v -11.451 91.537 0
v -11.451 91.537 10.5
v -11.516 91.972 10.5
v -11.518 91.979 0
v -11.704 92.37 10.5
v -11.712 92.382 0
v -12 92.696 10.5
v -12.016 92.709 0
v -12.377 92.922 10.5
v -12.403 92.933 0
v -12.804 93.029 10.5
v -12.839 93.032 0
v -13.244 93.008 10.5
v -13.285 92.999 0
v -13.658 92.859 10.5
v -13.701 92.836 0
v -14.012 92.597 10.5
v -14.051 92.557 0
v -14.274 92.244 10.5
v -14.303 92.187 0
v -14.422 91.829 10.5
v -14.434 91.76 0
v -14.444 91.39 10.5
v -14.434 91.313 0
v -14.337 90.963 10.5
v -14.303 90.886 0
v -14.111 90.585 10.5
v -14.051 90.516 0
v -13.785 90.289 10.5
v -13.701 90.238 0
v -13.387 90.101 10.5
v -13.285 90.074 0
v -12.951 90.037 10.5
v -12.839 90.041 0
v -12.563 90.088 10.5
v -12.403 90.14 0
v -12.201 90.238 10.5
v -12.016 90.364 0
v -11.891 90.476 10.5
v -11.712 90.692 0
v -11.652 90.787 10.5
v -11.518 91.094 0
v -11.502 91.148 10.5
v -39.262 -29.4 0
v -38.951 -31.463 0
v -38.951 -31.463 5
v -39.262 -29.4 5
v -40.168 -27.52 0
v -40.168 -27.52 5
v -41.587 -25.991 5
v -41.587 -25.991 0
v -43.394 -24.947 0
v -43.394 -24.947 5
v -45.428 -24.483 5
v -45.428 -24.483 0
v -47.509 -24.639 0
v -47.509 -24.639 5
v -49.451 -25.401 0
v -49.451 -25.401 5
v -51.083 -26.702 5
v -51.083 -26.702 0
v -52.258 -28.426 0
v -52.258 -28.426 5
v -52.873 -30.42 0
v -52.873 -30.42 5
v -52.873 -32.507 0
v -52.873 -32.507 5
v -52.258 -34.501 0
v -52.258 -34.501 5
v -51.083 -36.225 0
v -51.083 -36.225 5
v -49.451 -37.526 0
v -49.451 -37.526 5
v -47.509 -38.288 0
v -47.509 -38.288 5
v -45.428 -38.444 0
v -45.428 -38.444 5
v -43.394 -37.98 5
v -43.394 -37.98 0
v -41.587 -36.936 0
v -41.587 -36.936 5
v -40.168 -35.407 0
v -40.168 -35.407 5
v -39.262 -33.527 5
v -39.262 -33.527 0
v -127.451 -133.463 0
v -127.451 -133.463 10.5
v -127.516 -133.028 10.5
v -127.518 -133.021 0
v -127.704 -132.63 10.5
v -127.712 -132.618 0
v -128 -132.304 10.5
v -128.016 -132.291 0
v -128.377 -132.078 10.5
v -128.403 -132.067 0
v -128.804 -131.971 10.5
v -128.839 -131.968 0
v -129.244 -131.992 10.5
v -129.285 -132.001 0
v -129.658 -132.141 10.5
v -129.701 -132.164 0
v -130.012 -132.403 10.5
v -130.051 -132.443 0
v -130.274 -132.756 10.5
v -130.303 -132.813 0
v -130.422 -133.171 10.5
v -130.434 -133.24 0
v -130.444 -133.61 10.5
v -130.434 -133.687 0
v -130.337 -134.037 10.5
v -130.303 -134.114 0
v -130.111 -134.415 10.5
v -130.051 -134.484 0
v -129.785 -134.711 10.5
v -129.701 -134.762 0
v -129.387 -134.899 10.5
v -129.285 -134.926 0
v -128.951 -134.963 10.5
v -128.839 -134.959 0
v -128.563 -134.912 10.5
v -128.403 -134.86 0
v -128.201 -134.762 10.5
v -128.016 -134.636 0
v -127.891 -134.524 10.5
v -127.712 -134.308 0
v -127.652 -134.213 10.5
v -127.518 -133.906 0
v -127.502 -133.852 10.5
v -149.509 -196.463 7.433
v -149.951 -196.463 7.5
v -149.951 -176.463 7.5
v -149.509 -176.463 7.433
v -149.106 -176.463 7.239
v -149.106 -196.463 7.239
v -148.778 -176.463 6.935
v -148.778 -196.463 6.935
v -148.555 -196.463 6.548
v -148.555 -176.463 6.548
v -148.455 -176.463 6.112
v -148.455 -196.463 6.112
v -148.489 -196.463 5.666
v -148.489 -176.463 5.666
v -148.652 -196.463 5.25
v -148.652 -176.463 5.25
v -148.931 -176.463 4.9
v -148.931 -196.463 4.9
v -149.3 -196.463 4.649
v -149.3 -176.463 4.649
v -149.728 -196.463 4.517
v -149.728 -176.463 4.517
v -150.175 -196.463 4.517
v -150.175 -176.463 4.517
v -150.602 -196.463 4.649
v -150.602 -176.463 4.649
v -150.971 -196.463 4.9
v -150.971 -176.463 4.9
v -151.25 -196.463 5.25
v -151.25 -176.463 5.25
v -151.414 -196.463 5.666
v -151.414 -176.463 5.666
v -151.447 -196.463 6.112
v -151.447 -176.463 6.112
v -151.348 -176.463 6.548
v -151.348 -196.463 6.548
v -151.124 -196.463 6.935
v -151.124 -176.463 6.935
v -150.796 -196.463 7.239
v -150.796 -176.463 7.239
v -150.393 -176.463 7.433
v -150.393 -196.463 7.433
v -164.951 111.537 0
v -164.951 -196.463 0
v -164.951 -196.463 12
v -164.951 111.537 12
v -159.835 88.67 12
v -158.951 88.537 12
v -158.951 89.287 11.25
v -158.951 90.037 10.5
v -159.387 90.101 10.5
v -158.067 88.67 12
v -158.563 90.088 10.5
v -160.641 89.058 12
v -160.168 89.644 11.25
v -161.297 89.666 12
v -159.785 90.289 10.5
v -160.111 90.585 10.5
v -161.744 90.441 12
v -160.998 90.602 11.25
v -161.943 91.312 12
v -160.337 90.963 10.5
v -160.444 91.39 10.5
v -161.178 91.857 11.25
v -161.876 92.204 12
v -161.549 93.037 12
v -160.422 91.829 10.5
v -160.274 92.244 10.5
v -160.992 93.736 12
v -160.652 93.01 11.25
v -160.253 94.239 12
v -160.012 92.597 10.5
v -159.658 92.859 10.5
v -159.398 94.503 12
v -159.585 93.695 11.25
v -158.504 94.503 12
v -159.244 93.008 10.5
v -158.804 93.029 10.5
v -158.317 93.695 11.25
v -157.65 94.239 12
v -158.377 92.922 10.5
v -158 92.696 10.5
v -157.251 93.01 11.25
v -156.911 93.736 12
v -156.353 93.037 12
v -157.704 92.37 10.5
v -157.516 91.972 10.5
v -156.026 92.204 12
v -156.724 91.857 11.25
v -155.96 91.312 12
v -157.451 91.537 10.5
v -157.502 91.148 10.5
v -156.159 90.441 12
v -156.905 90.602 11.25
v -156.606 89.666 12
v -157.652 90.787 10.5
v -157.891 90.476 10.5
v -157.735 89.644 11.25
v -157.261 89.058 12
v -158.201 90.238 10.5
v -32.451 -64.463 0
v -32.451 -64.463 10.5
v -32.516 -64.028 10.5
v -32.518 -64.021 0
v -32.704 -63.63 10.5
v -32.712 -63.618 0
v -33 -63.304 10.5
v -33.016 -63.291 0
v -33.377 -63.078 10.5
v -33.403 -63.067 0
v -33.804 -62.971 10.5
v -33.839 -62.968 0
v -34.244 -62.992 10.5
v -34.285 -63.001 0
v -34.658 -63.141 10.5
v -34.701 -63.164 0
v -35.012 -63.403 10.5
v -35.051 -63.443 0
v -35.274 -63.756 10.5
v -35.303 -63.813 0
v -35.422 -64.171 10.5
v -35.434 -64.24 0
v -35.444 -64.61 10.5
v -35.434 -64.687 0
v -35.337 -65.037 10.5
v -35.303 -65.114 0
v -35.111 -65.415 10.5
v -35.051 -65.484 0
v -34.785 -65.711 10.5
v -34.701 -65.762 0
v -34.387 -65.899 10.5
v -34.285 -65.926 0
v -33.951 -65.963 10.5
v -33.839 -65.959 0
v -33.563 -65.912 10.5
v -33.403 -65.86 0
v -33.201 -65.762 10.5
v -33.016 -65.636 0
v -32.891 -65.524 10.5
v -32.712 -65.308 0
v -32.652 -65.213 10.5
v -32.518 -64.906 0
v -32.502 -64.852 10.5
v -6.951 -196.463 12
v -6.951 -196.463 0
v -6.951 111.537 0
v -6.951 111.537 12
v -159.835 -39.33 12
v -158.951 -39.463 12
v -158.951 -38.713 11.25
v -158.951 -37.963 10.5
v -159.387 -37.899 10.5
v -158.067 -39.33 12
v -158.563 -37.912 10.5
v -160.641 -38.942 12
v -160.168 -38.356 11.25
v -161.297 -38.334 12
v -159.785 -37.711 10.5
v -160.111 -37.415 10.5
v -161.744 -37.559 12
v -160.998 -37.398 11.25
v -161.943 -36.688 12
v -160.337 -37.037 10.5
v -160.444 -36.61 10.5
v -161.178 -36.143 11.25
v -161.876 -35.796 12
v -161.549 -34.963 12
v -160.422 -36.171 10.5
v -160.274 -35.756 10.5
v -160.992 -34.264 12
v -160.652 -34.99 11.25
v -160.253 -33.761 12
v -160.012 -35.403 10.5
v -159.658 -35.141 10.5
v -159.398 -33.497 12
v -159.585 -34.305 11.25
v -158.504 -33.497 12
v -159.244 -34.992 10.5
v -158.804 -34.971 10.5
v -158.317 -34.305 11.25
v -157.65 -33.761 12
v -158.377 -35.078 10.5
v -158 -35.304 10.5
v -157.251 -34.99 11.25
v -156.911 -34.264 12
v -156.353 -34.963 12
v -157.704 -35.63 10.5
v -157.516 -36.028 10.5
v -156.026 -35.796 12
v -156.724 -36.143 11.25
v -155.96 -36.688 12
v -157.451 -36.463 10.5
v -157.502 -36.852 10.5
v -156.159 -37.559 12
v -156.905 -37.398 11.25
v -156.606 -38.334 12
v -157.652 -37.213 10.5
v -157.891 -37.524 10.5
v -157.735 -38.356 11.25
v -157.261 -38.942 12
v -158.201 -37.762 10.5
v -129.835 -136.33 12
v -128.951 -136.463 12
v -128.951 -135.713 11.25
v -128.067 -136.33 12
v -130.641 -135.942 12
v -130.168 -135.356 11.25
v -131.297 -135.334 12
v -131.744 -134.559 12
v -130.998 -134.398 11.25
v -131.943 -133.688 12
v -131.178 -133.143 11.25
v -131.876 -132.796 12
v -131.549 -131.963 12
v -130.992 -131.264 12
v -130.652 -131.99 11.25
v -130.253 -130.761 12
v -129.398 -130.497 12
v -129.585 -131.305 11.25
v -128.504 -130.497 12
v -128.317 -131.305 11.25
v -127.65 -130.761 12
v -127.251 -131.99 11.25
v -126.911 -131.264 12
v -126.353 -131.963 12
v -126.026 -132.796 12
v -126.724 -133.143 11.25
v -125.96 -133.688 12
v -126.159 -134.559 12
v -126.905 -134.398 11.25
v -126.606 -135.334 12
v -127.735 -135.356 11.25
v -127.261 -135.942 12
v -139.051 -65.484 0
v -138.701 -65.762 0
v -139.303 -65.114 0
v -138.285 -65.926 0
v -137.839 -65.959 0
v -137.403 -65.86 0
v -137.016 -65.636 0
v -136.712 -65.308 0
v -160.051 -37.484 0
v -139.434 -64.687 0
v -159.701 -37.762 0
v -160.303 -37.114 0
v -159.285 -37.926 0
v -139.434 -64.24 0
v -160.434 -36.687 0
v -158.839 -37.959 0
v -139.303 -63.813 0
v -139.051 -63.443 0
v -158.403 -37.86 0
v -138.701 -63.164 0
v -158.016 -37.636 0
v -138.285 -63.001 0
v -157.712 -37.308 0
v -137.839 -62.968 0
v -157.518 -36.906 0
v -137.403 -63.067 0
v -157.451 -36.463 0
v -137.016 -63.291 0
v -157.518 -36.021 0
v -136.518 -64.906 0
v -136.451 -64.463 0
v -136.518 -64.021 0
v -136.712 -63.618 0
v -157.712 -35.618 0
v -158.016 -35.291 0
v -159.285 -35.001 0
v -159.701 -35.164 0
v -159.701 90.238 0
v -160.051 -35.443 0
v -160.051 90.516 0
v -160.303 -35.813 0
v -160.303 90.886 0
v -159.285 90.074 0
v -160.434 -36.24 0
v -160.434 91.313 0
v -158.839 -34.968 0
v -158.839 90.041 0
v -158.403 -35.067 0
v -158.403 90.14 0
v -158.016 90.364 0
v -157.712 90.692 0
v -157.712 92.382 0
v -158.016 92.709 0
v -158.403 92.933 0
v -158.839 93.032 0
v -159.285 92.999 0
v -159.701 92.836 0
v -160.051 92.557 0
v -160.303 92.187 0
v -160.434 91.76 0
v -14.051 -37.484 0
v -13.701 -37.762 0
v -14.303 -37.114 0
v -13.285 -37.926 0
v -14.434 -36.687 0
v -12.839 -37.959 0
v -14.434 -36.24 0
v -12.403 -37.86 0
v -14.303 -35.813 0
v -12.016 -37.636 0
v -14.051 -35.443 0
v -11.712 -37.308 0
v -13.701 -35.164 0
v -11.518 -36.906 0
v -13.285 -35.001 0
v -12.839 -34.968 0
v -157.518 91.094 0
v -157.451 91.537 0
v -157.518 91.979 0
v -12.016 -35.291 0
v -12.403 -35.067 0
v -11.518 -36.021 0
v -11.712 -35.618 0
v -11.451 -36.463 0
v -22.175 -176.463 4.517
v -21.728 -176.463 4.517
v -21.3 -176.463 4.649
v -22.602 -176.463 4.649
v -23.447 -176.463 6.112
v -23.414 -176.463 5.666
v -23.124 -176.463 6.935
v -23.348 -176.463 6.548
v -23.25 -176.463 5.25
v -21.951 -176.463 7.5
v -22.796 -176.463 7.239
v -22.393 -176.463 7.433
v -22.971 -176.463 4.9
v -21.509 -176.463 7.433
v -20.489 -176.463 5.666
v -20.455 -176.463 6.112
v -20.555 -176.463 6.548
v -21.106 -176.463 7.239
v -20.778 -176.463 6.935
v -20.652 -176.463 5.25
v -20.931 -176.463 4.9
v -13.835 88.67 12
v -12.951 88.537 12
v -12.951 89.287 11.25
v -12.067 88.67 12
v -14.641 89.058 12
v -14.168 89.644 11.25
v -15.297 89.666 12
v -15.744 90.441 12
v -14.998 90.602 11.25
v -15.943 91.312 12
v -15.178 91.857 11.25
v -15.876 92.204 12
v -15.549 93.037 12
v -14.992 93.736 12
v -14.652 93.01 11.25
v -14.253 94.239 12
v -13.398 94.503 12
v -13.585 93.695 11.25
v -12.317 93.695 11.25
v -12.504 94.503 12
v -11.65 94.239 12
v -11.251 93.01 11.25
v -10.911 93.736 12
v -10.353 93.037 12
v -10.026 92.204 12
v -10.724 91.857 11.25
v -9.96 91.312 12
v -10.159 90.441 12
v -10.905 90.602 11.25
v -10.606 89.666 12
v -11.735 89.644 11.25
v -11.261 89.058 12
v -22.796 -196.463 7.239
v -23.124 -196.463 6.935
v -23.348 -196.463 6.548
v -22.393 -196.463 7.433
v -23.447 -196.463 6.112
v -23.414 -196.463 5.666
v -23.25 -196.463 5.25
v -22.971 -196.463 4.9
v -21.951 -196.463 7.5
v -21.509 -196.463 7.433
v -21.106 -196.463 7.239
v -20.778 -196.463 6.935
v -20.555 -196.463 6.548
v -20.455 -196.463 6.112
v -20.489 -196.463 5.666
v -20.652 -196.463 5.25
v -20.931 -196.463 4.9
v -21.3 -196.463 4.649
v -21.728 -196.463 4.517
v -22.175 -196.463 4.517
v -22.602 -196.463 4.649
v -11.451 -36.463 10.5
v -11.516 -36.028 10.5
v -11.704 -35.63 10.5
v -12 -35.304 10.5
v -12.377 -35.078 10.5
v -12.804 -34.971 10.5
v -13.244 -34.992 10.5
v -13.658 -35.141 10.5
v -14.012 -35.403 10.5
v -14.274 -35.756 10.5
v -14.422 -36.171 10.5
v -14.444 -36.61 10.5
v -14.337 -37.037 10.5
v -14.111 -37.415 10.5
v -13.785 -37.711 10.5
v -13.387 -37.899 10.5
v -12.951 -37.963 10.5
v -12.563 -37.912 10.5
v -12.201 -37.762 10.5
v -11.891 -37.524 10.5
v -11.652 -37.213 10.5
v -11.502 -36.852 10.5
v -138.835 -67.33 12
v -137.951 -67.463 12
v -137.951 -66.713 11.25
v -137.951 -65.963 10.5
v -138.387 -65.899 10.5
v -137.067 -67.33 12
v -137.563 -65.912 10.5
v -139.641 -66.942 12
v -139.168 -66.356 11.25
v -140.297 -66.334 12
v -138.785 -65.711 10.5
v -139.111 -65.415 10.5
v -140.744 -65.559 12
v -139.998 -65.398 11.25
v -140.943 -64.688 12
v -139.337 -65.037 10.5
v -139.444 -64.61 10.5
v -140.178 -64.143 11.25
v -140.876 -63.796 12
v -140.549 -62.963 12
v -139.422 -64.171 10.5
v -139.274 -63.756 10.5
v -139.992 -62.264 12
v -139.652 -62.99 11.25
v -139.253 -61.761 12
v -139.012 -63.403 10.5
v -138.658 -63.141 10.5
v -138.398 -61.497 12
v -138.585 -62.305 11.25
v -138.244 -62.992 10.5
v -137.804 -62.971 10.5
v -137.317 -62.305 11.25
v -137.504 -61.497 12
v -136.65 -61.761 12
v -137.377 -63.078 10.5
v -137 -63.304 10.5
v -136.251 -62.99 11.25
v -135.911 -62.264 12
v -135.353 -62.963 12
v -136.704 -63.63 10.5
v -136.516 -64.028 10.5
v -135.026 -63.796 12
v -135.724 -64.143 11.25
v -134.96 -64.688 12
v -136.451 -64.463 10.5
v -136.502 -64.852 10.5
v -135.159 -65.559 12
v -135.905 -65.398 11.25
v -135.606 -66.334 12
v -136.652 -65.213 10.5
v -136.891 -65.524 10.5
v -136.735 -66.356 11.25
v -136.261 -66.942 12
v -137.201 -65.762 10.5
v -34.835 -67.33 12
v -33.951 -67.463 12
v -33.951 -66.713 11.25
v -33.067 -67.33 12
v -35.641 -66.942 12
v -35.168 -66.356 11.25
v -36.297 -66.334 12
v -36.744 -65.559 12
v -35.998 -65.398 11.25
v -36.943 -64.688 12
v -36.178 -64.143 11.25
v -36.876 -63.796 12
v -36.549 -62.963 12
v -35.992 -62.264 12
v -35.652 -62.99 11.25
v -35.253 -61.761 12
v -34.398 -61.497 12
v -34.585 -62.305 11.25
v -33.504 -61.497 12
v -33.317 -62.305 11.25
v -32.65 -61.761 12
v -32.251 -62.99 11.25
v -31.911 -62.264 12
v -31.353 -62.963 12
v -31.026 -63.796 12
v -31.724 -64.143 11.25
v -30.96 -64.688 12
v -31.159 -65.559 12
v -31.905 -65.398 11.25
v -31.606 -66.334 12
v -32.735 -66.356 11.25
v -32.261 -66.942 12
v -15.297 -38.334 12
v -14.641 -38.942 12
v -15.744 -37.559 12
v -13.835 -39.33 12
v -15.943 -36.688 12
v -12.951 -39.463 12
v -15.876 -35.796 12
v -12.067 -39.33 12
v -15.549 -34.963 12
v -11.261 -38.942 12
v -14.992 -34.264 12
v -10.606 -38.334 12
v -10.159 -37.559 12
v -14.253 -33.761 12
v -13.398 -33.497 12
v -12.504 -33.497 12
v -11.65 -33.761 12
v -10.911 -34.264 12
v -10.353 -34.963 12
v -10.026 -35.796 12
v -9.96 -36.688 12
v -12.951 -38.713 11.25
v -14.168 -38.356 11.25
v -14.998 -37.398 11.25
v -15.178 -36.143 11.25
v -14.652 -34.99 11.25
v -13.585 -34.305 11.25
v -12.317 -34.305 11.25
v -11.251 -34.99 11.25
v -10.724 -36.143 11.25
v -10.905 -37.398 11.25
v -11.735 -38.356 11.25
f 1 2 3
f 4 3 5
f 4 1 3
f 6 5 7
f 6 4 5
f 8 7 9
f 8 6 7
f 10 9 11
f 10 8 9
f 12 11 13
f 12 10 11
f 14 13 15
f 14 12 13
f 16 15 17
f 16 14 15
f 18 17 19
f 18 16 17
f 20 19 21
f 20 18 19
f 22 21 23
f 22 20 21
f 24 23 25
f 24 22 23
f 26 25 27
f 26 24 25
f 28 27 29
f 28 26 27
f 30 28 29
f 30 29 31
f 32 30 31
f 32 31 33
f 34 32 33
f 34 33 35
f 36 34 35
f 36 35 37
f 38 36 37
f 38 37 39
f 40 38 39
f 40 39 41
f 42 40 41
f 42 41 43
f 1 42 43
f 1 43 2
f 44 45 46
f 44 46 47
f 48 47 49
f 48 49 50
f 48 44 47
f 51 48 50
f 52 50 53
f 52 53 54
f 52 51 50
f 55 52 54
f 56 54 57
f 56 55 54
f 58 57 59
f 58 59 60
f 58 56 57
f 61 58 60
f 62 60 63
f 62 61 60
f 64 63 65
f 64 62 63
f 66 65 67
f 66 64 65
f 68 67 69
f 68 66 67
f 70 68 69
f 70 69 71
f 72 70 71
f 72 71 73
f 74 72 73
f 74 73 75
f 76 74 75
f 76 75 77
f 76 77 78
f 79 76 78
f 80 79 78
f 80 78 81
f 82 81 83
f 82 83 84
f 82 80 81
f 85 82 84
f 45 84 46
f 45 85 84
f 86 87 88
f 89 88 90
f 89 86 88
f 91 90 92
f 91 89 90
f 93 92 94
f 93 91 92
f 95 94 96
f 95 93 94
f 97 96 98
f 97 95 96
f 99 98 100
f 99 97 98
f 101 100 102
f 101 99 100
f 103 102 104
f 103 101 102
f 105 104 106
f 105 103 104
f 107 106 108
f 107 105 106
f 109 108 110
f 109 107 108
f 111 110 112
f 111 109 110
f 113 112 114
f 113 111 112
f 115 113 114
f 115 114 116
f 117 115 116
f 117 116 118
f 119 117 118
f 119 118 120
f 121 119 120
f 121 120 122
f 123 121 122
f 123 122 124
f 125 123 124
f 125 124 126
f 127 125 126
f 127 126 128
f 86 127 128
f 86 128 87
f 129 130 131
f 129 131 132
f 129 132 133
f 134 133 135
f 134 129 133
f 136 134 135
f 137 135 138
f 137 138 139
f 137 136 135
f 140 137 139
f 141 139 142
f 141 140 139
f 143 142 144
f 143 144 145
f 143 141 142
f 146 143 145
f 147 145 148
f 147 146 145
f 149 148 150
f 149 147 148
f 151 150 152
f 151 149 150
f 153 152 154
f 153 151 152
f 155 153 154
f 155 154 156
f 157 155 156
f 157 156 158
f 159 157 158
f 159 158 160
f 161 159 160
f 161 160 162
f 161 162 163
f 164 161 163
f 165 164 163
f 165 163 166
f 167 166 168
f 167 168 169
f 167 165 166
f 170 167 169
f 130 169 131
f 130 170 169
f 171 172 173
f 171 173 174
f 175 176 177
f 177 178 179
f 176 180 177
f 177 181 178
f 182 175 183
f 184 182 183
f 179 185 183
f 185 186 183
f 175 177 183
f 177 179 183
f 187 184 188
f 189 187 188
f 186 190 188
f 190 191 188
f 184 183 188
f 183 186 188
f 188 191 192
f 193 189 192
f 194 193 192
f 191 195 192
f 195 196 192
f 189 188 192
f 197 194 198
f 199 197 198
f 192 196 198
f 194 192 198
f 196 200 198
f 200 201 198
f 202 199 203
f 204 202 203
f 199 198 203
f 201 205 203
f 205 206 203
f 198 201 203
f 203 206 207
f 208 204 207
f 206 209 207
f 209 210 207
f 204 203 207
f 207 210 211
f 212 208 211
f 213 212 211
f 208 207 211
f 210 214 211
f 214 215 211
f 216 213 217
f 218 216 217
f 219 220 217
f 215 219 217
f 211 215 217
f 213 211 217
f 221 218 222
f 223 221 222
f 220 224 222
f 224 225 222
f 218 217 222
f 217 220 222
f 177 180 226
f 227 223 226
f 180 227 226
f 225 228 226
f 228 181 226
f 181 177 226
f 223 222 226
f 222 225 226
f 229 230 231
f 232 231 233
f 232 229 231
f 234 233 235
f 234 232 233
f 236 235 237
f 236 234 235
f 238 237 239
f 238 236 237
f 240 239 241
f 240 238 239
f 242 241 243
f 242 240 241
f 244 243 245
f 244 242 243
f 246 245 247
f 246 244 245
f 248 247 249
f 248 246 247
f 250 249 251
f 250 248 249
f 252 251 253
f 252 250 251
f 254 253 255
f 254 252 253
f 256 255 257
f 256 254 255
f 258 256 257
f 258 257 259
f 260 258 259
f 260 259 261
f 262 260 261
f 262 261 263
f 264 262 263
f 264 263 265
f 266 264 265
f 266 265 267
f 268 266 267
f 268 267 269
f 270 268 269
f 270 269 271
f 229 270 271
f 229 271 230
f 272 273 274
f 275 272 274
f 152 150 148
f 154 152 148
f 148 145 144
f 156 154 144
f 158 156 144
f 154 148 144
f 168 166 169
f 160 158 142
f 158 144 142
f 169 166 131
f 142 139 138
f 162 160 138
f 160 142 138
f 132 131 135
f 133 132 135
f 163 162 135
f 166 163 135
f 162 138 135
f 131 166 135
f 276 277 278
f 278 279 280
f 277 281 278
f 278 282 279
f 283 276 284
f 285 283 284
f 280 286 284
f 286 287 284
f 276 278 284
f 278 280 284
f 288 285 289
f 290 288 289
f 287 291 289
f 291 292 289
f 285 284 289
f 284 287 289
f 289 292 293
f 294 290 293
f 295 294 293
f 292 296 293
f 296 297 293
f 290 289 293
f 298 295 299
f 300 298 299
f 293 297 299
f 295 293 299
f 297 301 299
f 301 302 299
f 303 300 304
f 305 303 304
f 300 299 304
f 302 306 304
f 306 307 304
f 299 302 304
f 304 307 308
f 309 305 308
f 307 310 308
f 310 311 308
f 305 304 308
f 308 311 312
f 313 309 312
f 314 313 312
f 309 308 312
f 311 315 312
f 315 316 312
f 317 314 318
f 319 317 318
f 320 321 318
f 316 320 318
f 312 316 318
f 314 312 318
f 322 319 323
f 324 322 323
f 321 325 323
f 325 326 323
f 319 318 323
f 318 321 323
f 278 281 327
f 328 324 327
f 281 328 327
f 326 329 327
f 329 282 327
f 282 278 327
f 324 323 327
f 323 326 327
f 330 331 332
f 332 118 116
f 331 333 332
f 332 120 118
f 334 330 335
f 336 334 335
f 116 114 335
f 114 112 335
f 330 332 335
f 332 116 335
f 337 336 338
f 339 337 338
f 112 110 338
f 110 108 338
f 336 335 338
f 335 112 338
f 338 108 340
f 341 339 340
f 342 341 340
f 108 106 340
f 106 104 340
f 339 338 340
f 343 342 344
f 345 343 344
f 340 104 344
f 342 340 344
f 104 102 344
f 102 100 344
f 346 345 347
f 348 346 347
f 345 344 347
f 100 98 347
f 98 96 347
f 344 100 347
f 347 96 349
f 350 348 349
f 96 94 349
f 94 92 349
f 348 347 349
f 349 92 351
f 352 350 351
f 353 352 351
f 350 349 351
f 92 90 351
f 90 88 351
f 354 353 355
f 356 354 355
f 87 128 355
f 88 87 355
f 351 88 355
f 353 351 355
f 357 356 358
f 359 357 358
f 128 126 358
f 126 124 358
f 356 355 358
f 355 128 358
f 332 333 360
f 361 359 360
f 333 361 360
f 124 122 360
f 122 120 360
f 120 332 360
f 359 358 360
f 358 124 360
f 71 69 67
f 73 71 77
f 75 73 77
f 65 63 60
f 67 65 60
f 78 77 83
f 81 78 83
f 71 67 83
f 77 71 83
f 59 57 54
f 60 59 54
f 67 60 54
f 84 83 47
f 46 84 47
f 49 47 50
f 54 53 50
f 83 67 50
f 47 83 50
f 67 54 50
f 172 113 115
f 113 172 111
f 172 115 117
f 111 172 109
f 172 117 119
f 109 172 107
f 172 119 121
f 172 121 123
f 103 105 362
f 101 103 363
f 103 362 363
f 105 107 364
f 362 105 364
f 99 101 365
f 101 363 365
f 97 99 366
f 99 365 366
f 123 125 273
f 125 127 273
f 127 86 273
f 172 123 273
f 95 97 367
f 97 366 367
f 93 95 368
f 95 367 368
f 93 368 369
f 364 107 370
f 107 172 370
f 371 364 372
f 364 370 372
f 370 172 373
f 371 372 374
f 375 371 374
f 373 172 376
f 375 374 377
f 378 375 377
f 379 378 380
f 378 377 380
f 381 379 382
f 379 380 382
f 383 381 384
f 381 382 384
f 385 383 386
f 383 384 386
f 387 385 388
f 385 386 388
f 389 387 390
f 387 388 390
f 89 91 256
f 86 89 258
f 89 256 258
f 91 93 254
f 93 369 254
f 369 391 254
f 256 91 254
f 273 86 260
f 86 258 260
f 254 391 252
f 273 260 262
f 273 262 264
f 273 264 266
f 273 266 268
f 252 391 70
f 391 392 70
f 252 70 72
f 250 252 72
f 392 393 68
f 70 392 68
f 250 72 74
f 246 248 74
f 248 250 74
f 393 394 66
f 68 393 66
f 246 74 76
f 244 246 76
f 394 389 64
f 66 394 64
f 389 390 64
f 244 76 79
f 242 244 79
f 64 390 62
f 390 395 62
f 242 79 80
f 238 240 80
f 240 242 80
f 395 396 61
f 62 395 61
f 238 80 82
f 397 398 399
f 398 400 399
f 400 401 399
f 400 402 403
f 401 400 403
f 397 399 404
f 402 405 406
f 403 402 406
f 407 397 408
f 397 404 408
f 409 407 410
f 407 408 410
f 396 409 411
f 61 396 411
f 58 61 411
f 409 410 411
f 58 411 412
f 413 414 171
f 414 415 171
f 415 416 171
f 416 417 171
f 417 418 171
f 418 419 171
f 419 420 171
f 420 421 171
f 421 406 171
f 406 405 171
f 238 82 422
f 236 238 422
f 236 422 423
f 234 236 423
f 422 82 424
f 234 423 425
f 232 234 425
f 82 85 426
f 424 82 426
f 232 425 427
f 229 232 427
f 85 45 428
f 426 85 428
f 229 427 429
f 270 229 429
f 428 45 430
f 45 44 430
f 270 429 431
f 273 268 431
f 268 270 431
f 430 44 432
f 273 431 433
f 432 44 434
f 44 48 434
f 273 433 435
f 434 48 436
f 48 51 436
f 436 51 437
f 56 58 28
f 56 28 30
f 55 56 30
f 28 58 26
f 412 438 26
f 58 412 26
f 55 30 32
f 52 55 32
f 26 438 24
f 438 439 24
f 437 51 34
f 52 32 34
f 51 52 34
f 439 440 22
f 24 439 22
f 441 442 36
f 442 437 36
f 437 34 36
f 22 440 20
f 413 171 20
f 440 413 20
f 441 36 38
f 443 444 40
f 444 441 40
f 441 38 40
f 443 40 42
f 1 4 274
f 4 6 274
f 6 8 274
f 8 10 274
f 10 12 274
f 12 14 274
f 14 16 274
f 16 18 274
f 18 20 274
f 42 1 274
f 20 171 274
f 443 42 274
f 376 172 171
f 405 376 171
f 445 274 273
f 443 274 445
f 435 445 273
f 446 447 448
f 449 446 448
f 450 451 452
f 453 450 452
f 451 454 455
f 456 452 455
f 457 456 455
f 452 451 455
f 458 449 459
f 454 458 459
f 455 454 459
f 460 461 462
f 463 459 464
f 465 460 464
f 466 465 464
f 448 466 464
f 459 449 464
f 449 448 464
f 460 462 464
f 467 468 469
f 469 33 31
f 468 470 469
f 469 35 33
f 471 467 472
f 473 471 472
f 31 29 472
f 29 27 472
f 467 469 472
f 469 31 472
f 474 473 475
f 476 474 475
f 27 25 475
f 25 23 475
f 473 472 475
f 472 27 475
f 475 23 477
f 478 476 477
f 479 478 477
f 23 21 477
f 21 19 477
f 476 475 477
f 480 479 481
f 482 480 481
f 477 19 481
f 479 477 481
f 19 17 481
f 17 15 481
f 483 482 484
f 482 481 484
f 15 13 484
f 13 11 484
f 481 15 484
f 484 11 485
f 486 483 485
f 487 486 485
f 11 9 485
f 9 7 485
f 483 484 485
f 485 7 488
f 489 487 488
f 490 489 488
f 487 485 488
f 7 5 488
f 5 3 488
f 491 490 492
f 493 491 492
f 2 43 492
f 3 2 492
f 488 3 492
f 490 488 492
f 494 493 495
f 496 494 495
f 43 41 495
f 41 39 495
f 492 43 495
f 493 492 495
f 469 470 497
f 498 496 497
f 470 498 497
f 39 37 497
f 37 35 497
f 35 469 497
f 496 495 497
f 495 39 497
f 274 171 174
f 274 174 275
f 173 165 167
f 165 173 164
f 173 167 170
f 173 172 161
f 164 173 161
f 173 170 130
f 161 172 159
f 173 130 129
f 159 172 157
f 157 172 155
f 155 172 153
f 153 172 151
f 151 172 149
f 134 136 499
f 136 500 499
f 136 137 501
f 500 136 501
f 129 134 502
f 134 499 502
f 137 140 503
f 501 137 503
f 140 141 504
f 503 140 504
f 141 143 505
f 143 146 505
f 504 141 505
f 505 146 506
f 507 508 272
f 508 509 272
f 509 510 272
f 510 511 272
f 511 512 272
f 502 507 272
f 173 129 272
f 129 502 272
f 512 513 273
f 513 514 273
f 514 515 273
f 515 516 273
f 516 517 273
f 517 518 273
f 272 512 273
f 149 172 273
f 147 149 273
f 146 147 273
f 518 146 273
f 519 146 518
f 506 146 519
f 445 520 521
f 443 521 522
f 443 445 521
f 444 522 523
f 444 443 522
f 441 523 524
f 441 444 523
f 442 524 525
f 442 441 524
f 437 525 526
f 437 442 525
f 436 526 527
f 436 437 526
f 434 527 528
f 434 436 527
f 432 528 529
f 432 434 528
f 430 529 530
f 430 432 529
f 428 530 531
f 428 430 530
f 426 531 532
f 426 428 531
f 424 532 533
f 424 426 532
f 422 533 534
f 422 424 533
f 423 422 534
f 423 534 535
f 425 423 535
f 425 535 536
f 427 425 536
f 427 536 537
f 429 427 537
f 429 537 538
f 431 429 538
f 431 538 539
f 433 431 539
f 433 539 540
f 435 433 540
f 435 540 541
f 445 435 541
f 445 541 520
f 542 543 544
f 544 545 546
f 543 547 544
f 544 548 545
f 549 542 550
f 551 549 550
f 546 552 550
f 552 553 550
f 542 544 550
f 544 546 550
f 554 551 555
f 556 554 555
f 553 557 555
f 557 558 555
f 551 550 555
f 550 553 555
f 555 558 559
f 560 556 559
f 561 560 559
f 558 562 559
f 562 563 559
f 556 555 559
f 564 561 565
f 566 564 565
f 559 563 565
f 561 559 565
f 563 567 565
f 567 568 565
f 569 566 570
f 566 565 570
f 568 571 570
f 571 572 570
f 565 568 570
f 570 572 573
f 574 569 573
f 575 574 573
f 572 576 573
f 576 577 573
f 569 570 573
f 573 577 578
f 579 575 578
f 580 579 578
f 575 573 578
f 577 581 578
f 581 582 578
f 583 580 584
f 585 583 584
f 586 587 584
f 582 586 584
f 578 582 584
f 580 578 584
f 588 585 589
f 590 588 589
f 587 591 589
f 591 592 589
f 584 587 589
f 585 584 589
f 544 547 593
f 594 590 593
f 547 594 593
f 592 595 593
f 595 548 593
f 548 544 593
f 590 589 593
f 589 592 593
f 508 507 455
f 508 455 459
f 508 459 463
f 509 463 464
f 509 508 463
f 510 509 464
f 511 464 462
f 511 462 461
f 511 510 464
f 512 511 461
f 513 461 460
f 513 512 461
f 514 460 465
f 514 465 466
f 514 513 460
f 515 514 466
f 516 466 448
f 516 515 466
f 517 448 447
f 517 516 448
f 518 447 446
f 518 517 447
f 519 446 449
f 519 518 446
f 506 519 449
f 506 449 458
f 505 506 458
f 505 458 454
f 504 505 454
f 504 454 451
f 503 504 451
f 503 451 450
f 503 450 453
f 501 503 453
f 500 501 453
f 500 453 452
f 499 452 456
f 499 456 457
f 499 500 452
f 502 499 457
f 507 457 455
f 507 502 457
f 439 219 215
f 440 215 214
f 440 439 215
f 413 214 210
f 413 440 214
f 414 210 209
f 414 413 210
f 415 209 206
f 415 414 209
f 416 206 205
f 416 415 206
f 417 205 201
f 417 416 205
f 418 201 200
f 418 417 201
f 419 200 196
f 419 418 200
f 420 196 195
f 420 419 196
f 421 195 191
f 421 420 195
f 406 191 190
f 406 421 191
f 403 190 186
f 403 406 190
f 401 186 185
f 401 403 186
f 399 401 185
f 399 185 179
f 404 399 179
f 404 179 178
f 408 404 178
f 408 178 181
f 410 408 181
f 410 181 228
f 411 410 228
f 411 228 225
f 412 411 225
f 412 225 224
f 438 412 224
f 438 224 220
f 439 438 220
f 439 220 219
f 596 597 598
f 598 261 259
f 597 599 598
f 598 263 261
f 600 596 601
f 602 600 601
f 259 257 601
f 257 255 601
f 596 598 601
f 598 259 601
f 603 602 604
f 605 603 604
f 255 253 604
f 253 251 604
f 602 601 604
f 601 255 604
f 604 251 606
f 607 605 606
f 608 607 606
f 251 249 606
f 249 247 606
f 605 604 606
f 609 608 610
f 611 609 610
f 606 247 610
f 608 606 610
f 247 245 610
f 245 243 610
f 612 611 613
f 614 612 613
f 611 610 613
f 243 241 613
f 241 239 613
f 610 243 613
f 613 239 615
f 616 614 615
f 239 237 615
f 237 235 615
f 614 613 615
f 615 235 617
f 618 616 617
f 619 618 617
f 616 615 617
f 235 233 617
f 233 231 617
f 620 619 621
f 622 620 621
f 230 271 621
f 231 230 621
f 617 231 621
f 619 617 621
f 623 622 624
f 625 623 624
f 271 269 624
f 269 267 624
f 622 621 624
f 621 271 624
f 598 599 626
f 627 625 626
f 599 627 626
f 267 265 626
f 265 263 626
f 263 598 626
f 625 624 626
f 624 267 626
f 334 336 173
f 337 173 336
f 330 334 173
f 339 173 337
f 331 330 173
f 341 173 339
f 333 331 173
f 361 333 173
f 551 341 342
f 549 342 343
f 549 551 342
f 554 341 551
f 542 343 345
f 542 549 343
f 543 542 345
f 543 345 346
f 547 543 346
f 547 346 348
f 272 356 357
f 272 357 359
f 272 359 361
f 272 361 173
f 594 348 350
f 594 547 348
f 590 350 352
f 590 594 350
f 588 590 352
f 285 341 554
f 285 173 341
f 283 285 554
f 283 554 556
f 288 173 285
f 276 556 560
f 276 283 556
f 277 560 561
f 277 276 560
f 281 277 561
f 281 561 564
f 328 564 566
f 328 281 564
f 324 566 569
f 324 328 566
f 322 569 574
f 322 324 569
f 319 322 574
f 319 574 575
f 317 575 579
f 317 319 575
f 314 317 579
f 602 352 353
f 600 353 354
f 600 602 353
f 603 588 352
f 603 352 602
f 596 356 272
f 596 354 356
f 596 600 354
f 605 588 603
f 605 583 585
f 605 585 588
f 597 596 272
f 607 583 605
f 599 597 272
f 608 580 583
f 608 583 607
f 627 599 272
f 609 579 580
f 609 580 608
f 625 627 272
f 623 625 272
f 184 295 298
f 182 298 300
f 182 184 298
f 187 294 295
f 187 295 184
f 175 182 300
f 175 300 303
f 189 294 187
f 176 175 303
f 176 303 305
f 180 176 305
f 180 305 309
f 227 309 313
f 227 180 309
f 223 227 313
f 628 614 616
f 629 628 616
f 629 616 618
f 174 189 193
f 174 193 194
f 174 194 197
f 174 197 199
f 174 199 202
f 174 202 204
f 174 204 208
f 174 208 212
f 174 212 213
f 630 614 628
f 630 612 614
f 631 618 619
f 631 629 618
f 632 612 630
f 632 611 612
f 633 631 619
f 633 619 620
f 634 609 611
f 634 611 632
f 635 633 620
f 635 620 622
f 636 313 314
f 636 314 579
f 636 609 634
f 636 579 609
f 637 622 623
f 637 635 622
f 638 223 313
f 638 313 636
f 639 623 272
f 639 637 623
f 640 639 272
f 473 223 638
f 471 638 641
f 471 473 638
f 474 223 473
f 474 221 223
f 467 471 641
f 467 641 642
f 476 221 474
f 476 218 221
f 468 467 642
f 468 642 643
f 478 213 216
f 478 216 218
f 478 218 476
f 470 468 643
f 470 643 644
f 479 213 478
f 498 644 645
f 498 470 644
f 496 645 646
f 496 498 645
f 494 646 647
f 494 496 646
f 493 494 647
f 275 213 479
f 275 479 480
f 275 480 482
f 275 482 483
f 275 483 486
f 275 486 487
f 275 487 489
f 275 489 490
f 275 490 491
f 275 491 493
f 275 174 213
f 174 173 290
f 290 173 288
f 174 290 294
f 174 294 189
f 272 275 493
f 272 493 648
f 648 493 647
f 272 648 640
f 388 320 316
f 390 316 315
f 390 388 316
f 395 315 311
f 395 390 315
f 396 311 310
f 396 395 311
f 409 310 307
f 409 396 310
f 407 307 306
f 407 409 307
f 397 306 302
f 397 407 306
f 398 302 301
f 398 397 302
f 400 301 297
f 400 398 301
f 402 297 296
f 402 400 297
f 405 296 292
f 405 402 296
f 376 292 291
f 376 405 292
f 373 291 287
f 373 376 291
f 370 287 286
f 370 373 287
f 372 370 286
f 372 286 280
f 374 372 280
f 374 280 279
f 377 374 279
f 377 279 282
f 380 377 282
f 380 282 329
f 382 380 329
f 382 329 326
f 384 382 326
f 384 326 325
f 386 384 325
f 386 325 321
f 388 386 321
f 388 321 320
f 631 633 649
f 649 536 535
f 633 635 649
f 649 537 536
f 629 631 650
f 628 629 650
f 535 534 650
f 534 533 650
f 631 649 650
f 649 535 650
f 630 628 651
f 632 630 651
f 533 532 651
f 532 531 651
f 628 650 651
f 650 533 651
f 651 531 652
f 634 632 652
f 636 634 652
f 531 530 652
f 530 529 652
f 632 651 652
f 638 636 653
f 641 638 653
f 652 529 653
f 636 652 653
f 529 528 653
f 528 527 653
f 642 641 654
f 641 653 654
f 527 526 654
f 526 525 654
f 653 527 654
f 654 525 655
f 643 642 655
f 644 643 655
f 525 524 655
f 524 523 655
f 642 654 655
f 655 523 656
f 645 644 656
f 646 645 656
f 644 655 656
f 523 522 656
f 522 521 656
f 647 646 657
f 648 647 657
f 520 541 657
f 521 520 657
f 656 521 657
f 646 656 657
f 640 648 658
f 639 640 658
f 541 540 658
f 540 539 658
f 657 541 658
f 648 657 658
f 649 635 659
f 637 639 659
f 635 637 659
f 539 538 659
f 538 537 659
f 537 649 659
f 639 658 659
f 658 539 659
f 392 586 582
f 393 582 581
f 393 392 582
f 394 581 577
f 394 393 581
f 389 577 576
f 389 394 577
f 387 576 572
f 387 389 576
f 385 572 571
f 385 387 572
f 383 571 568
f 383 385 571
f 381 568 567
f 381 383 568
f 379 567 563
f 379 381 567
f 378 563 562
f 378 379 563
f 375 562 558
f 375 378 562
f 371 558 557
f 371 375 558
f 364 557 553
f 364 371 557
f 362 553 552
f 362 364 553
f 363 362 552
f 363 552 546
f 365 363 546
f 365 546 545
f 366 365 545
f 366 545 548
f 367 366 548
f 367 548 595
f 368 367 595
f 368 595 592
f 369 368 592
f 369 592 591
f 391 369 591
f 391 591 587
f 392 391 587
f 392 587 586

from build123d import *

# Parameters (mm, degrees)
SKETCH1_W           = 158
SKETCH1_H           = 308
SKETCH1_R           = 1.5
BOSS_EXTRUDE1_DEPTH = 12
CUT_EXTRUDE3_START  = -196.463415
SKETCH4_R           = 1.5
CUT_EXTRUDE3_DEPTH  = 20
SKETCH6_R           = 7
CUT_EXTRUDE5_DEPTH  = 5


with BuildPart() as part:
    # Sketch1 → Boss-Extrude1 (new body)
    with BuildSketch(Plane.XY):
        with Locations((-85.951219512, -42.463414634)):
            Rectangle(SKETCH1_W, SKETCH1_H)
        with Locations((-137.951219512, -64.463414634)):
            Circle(SKETCH1_R, mode=Mode.SUBTRACT)
        with Locations((-33.951219512, -64.463414634)):
            Circle(SKETCH1_R, mode=Mode.SUBTRACT)
        with Locations((-128.951219512, -133.463414634)):
            Circle(SKETCH1_R, mode=Mode.SUBTRACT)
        with Locations((-158.951219512, 91.536585366)):
            Circle(SKETCH1_R, mode=Mode.SUBTRACT)
        with Locations((-158.951219512, -36.463414634)):
            Circle(SKETCH1_R, mode=Mode.SUBTRACT)
        with Locations((-12.951219512, 91.536585366)):
            Circle(SKETCH1_R, mode=Mode.SUBTRACT)
        with Locations((-12.951219512, -36.463414634)):
            Circle(SKETCH1_R, mode=Mode.SUBTRACT)
    extrude(amount=BOSS_EXTRUDE1_DEPTH)

    # Sketch4 → Cut-Extrude3 (cut)
    with BuildSketch(Plane(origin=(0, 0, 0), x_dir=(1, 0, 0), z_dir=(0, 1, 0)).offset(CUT_EXTRUDE3_START)):
        with Locations(Location((-149.951219512, -6, 0), (0, 0, 270))):
            Circle(SKETCH4_R)
        with Locations(Location((-21.951219512, -6, 0), (0, 0, 270))):
            Circle(SKETCH4_R)
    extrude(amount=CUT_EXTRUDE3_DEPTH, mode=Mode.SUBTRACT)

    # Cut-Extrude4 cone 1 section (through the dimple's axis) → Cut-Extrude4 (revolve, cut)
    with BuildSketch(Plane(origin=(-137.951219512, -64.463414634, 12), x_dir=(0, -1, 0), z_dir=(1, 0, 0))):
        Polygon((0, 0), (3, 0), (0, 3), align=None)
    revolve(axis=Axis((-137.951219512, -64.463414634, 12), (0, 0, -1)), mode=Mode.SUBTRACT)

    # Cut-Extrude4 cone 2 section (through the dimple's axis) → Cut-Extrude4 cone 2 (revolve, cut)
    with BuildSketch(Plane(origin=(-33.951219512, -64.463414634, 12), x_dir=(0, -1, 0), z_dir=(1, 0, 0))):
        Polygon((0, 0), (3, 0), (0, 3), align=None)
    revolve(axis=Axis((-33.951219512, -64.463414634, 12), (0, 0, -1)), mode=Mode.SUBTRACT)

    # Cut-Extrude4 cone 3 section (through the dimple's axis) → Cut-Extrude4 cone 3 (revolve, cut)
    with BuildSketch(Plane(origin=(-128.951219512, -133.463414634, 12), x_dir=(0, -1, 0), z_dir=(1, 0, 0))):
        Polygon((0, 0), (3, 0), (0, 3), align=None)
    revolve(axis=Axis((-128.951219512, -133.463414634, 12), (0, 0, -1)), mode=Mode.SUBTRACT)

    # Cut-Extrude4 cone 4 section (through the dimple's axis) → Cut-Extrude4 cone 4 (revolve, cut)
    with BuildSketch(Plane(origin=(-158.951219512, 91.536585366, 12), x_dir=(0, -1, 0), z_dir=(1, 0, 0))):
        Polygon((0, 0), (3, 0), (0, 3), align=None)
    revolve(axis=Axis((-158.951219512, 91.536585366, 12), (0, 0, -1)), mode=Mode.SUBTRACT)

    # Cut-Extrude4 cone 5 section (through the dimple's axis) → Cut-Extrude4 cone 5 (revolve, cut)
    with BuildSketch(Plane(origin=(-158.951219512, -36.463414634, 12), x_dir=(0, -1, 0), z_dir=(1, 0, 0))):
        Polygon((0, 0), (3, 0), (0, 3), align=None)
    revolve(axis=Axis((-158.951219512, -36.463414634, 12), (0, 0, -1)), mode=Mode.SUBTRACT)

    # Cut-Extrude4 cone 6 section (through the dimple's axis) → Cut-Extrude4 cone 6 (revolve, cut)
    with BuildSketch(Plane(origin=(-12.951219512, 91.536585366, 12), x_dir=(0, -1, 0), z_dir=(1, 0, 0))):
        Polygon((0, 0), (3, 0), (0, 3), align=None)
    revolve(axis=Axis((-12.951219512, 91.536585366, 12), (0, 0, -1)), mode=Mode.SUBTRACT)

    # Cut-Extrude4 cone 7 section (through the dimple's axis) → Cut-Extrude4 cone 7 (revolve, cut)
    with BuildSketch(Plane(origin=(-12.951219512, -36.463414634, 12), x_dir=(0, -1, 0), z_dir=(1, 0, 0))):
        Polygon((0, 0), (3, 0), (0, 3), align=None)
    revolve(axis=Axis((-12.951219512, -36.463414634, 12), (0, 0, -1)), mode=Mode.SUBTRACT)

    # Sketch6 → Cut-Extrude5 (cut)
    with BuildSketch(Plane.XY):
        with Locations((-45.951219512, -31.463414634)):
            Circle(SKETCH6_R)
    extrude(amount=CUT_EXTRUDE5_DEPTH, mode=Mode.SUBTRACT)


solid = part.part
